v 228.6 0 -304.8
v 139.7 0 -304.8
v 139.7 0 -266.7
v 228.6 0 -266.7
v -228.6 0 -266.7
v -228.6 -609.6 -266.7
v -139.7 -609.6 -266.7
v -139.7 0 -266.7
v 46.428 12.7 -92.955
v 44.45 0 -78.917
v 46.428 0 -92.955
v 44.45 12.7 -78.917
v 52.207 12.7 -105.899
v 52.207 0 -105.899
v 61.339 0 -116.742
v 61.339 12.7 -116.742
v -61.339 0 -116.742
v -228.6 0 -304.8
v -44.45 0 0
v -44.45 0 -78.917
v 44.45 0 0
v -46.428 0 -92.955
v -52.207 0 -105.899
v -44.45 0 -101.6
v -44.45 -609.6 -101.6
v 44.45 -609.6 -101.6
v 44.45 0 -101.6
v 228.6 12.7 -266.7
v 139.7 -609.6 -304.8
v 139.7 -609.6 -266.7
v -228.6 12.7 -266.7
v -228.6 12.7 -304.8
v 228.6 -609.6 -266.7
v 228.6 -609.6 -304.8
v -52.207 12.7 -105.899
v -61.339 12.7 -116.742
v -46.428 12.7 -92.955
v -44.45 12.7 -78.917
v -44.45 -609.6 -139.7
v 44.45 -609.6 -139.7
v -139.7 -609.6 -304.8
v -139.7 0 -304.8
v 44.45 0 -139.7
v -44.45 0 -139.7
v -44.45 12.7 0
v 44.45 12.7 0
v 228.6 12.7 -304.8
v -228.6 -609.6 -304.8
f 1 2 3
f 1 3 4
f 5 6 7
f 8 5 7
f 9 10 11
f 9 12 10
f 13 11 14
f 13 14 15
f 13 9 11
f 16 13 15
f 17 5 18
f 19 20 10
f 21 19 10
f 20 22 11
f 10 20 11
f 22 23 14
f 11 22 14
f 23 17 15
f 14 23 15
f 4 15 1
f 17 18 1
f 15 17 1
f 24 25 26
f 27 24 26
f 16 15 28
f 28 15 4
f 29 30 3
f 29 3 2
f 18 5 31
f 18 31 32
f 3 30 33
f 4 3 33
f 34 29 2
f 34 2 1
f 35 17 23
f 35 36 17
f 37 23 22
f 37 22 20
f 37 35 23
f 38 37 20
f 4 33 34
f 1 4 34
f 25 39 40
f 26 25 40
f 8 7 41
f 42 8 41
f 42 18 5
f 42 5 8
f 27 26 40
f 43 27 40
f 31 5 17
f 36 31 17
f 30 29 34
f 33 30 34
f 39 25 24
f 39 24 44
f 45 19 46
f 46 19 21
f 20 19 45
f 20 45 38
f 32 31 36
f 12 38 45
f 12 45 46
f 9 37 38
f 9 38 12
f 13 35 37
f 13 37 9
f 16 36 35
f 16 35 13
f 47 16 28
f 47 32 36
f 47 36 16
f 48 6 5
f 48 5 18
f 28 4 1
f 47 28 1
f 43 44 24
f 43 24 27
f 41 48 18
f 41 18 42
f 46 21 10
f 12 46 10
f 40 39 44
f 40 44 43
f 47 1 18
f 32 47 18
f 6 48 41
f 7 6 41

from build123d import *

# Parameters (mm, degrees)
BOSS_EXTRUDE1_DEPTH   = 12.7
SKETCH1_3_W           = 88.9
SKETCH1_3_H           = 38.1
BOSS_EXTRUDE2_DEPTH   = 609.6
BOSS_EXTRUDE2_2_DEPTH = 609.6
BOSS_EXTRUDE2_3_DEPTH = 609.6
FILLET1_R             = 50.8


with BuildPart() as part:
    # Sketch1 → Boss-Extrude1 (new body)
    with BuildSketch(Plane(origin=(0, 0, 0), x_dir=(1, 0, 0), z_dir=(0, 1, 0))):
        Polygon((-228.6, 304.8), (-228.6, 266.7), (-44.45, 101.6), (-44.45, 0), (44.45, 0), (44.45, 101.6), (228.6, 266.7), (228.6, 304.8), align=None)
    extrude(amount=BOSS_EXTRUDE1_DEPTH)

    # Fillet1
    fillet1_edges = [part.edges().sort_by_distance(p)[0] for p in [
        (44.45, 6.35, -101.6),
        (-44.45, 6.35, -101.6),
    ]]
    fillet(fillet1_edges, radius=FILLET1_R)


with BuildPart() as body_2:
    # Sketch1<3> → Boss-Extrude2 (new body)
    with BuildSketch(Plane(origin=(0, 0, 0), x_dir=(1, 0, 0), z_dir=(0, 1, 0))):
        with Locations((-184.15, 285.75)):
            Rectangle(SKETCH1_3_W, SKETCH1_3_H)
    extrude(amount=-BOSS_EXTRUDE2_DEPTH)


with BuildPart() as body_3:
    # Sketch1<3> → Boss-Extrude2 2 (new body)
    with BuildSketch(Plane(origin=(0, 0, 0), x_dir=(1, 0, 0), z_dir=(0, 1, 0))):
        with Locations((184.15, 285.75)):
            Rectangle(SKETCH1_3_W, SKETCH1_3_H)
    extrude(amount=-BOSS_EXTRUDE2_2_DEPTH)


with BuildPart() as body_4:
    # Sketch1<3> → Boss-Extrude2 3 (new body)
    with BuildSketch(Plane(origin=(0, 0, 0), x_dir=(1, 0, 0), z_dir=(0, 1, 0))):
        with Locations((0, 120.65)):
            Rectangle(SKETCH1_3_W, SKETCH1_3_H)
    extrude(amount=-BOSS_EXTRUDE2_3_DEPTH)


solid = Compound([part.part, body_2.part, body_3.part, body_4.part])
